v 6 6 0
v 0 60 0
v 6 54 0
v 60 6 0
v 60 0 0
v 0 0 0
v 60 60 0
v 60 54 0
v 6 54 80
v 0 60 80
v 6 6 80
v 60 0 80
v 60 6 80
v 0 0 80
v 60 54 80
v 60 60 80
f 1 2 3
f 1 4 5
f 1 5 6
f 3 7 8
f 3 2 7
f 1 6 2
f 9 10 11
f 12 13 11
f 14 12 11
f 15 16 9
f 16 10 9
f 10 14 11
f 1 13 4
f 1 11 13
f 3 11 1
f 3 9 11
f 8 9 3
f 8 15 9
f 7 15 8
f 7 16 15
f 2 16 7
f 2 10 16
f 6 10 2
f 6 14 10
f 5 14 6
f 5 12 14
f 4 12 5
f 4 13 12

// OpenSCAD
$fn = 32;

// ----------------------------------------------------------------------
// Structural section: channel 60 x 60 mm
// ----------------------------------------------------------------------

// --- parameters (mm) ---
sec_w = 60;               // channel width, X
sec_h = 60;               // channel height, Y
flange_t = 6;             // flange thickness
web_t = 6;                // web thickness
plate_t = 80;             // cut length, Z (extrusion height)

profile = [[0, 0], [60, 0], [60, 6], [6, 6], [6, 54], [60, 54], [60, 60], [0, 60]];  // primary outline, 8 points, counter clockwise

// --- the one profile operation ---
linear_extrude(height = plate_t) polygon(points = profile);
